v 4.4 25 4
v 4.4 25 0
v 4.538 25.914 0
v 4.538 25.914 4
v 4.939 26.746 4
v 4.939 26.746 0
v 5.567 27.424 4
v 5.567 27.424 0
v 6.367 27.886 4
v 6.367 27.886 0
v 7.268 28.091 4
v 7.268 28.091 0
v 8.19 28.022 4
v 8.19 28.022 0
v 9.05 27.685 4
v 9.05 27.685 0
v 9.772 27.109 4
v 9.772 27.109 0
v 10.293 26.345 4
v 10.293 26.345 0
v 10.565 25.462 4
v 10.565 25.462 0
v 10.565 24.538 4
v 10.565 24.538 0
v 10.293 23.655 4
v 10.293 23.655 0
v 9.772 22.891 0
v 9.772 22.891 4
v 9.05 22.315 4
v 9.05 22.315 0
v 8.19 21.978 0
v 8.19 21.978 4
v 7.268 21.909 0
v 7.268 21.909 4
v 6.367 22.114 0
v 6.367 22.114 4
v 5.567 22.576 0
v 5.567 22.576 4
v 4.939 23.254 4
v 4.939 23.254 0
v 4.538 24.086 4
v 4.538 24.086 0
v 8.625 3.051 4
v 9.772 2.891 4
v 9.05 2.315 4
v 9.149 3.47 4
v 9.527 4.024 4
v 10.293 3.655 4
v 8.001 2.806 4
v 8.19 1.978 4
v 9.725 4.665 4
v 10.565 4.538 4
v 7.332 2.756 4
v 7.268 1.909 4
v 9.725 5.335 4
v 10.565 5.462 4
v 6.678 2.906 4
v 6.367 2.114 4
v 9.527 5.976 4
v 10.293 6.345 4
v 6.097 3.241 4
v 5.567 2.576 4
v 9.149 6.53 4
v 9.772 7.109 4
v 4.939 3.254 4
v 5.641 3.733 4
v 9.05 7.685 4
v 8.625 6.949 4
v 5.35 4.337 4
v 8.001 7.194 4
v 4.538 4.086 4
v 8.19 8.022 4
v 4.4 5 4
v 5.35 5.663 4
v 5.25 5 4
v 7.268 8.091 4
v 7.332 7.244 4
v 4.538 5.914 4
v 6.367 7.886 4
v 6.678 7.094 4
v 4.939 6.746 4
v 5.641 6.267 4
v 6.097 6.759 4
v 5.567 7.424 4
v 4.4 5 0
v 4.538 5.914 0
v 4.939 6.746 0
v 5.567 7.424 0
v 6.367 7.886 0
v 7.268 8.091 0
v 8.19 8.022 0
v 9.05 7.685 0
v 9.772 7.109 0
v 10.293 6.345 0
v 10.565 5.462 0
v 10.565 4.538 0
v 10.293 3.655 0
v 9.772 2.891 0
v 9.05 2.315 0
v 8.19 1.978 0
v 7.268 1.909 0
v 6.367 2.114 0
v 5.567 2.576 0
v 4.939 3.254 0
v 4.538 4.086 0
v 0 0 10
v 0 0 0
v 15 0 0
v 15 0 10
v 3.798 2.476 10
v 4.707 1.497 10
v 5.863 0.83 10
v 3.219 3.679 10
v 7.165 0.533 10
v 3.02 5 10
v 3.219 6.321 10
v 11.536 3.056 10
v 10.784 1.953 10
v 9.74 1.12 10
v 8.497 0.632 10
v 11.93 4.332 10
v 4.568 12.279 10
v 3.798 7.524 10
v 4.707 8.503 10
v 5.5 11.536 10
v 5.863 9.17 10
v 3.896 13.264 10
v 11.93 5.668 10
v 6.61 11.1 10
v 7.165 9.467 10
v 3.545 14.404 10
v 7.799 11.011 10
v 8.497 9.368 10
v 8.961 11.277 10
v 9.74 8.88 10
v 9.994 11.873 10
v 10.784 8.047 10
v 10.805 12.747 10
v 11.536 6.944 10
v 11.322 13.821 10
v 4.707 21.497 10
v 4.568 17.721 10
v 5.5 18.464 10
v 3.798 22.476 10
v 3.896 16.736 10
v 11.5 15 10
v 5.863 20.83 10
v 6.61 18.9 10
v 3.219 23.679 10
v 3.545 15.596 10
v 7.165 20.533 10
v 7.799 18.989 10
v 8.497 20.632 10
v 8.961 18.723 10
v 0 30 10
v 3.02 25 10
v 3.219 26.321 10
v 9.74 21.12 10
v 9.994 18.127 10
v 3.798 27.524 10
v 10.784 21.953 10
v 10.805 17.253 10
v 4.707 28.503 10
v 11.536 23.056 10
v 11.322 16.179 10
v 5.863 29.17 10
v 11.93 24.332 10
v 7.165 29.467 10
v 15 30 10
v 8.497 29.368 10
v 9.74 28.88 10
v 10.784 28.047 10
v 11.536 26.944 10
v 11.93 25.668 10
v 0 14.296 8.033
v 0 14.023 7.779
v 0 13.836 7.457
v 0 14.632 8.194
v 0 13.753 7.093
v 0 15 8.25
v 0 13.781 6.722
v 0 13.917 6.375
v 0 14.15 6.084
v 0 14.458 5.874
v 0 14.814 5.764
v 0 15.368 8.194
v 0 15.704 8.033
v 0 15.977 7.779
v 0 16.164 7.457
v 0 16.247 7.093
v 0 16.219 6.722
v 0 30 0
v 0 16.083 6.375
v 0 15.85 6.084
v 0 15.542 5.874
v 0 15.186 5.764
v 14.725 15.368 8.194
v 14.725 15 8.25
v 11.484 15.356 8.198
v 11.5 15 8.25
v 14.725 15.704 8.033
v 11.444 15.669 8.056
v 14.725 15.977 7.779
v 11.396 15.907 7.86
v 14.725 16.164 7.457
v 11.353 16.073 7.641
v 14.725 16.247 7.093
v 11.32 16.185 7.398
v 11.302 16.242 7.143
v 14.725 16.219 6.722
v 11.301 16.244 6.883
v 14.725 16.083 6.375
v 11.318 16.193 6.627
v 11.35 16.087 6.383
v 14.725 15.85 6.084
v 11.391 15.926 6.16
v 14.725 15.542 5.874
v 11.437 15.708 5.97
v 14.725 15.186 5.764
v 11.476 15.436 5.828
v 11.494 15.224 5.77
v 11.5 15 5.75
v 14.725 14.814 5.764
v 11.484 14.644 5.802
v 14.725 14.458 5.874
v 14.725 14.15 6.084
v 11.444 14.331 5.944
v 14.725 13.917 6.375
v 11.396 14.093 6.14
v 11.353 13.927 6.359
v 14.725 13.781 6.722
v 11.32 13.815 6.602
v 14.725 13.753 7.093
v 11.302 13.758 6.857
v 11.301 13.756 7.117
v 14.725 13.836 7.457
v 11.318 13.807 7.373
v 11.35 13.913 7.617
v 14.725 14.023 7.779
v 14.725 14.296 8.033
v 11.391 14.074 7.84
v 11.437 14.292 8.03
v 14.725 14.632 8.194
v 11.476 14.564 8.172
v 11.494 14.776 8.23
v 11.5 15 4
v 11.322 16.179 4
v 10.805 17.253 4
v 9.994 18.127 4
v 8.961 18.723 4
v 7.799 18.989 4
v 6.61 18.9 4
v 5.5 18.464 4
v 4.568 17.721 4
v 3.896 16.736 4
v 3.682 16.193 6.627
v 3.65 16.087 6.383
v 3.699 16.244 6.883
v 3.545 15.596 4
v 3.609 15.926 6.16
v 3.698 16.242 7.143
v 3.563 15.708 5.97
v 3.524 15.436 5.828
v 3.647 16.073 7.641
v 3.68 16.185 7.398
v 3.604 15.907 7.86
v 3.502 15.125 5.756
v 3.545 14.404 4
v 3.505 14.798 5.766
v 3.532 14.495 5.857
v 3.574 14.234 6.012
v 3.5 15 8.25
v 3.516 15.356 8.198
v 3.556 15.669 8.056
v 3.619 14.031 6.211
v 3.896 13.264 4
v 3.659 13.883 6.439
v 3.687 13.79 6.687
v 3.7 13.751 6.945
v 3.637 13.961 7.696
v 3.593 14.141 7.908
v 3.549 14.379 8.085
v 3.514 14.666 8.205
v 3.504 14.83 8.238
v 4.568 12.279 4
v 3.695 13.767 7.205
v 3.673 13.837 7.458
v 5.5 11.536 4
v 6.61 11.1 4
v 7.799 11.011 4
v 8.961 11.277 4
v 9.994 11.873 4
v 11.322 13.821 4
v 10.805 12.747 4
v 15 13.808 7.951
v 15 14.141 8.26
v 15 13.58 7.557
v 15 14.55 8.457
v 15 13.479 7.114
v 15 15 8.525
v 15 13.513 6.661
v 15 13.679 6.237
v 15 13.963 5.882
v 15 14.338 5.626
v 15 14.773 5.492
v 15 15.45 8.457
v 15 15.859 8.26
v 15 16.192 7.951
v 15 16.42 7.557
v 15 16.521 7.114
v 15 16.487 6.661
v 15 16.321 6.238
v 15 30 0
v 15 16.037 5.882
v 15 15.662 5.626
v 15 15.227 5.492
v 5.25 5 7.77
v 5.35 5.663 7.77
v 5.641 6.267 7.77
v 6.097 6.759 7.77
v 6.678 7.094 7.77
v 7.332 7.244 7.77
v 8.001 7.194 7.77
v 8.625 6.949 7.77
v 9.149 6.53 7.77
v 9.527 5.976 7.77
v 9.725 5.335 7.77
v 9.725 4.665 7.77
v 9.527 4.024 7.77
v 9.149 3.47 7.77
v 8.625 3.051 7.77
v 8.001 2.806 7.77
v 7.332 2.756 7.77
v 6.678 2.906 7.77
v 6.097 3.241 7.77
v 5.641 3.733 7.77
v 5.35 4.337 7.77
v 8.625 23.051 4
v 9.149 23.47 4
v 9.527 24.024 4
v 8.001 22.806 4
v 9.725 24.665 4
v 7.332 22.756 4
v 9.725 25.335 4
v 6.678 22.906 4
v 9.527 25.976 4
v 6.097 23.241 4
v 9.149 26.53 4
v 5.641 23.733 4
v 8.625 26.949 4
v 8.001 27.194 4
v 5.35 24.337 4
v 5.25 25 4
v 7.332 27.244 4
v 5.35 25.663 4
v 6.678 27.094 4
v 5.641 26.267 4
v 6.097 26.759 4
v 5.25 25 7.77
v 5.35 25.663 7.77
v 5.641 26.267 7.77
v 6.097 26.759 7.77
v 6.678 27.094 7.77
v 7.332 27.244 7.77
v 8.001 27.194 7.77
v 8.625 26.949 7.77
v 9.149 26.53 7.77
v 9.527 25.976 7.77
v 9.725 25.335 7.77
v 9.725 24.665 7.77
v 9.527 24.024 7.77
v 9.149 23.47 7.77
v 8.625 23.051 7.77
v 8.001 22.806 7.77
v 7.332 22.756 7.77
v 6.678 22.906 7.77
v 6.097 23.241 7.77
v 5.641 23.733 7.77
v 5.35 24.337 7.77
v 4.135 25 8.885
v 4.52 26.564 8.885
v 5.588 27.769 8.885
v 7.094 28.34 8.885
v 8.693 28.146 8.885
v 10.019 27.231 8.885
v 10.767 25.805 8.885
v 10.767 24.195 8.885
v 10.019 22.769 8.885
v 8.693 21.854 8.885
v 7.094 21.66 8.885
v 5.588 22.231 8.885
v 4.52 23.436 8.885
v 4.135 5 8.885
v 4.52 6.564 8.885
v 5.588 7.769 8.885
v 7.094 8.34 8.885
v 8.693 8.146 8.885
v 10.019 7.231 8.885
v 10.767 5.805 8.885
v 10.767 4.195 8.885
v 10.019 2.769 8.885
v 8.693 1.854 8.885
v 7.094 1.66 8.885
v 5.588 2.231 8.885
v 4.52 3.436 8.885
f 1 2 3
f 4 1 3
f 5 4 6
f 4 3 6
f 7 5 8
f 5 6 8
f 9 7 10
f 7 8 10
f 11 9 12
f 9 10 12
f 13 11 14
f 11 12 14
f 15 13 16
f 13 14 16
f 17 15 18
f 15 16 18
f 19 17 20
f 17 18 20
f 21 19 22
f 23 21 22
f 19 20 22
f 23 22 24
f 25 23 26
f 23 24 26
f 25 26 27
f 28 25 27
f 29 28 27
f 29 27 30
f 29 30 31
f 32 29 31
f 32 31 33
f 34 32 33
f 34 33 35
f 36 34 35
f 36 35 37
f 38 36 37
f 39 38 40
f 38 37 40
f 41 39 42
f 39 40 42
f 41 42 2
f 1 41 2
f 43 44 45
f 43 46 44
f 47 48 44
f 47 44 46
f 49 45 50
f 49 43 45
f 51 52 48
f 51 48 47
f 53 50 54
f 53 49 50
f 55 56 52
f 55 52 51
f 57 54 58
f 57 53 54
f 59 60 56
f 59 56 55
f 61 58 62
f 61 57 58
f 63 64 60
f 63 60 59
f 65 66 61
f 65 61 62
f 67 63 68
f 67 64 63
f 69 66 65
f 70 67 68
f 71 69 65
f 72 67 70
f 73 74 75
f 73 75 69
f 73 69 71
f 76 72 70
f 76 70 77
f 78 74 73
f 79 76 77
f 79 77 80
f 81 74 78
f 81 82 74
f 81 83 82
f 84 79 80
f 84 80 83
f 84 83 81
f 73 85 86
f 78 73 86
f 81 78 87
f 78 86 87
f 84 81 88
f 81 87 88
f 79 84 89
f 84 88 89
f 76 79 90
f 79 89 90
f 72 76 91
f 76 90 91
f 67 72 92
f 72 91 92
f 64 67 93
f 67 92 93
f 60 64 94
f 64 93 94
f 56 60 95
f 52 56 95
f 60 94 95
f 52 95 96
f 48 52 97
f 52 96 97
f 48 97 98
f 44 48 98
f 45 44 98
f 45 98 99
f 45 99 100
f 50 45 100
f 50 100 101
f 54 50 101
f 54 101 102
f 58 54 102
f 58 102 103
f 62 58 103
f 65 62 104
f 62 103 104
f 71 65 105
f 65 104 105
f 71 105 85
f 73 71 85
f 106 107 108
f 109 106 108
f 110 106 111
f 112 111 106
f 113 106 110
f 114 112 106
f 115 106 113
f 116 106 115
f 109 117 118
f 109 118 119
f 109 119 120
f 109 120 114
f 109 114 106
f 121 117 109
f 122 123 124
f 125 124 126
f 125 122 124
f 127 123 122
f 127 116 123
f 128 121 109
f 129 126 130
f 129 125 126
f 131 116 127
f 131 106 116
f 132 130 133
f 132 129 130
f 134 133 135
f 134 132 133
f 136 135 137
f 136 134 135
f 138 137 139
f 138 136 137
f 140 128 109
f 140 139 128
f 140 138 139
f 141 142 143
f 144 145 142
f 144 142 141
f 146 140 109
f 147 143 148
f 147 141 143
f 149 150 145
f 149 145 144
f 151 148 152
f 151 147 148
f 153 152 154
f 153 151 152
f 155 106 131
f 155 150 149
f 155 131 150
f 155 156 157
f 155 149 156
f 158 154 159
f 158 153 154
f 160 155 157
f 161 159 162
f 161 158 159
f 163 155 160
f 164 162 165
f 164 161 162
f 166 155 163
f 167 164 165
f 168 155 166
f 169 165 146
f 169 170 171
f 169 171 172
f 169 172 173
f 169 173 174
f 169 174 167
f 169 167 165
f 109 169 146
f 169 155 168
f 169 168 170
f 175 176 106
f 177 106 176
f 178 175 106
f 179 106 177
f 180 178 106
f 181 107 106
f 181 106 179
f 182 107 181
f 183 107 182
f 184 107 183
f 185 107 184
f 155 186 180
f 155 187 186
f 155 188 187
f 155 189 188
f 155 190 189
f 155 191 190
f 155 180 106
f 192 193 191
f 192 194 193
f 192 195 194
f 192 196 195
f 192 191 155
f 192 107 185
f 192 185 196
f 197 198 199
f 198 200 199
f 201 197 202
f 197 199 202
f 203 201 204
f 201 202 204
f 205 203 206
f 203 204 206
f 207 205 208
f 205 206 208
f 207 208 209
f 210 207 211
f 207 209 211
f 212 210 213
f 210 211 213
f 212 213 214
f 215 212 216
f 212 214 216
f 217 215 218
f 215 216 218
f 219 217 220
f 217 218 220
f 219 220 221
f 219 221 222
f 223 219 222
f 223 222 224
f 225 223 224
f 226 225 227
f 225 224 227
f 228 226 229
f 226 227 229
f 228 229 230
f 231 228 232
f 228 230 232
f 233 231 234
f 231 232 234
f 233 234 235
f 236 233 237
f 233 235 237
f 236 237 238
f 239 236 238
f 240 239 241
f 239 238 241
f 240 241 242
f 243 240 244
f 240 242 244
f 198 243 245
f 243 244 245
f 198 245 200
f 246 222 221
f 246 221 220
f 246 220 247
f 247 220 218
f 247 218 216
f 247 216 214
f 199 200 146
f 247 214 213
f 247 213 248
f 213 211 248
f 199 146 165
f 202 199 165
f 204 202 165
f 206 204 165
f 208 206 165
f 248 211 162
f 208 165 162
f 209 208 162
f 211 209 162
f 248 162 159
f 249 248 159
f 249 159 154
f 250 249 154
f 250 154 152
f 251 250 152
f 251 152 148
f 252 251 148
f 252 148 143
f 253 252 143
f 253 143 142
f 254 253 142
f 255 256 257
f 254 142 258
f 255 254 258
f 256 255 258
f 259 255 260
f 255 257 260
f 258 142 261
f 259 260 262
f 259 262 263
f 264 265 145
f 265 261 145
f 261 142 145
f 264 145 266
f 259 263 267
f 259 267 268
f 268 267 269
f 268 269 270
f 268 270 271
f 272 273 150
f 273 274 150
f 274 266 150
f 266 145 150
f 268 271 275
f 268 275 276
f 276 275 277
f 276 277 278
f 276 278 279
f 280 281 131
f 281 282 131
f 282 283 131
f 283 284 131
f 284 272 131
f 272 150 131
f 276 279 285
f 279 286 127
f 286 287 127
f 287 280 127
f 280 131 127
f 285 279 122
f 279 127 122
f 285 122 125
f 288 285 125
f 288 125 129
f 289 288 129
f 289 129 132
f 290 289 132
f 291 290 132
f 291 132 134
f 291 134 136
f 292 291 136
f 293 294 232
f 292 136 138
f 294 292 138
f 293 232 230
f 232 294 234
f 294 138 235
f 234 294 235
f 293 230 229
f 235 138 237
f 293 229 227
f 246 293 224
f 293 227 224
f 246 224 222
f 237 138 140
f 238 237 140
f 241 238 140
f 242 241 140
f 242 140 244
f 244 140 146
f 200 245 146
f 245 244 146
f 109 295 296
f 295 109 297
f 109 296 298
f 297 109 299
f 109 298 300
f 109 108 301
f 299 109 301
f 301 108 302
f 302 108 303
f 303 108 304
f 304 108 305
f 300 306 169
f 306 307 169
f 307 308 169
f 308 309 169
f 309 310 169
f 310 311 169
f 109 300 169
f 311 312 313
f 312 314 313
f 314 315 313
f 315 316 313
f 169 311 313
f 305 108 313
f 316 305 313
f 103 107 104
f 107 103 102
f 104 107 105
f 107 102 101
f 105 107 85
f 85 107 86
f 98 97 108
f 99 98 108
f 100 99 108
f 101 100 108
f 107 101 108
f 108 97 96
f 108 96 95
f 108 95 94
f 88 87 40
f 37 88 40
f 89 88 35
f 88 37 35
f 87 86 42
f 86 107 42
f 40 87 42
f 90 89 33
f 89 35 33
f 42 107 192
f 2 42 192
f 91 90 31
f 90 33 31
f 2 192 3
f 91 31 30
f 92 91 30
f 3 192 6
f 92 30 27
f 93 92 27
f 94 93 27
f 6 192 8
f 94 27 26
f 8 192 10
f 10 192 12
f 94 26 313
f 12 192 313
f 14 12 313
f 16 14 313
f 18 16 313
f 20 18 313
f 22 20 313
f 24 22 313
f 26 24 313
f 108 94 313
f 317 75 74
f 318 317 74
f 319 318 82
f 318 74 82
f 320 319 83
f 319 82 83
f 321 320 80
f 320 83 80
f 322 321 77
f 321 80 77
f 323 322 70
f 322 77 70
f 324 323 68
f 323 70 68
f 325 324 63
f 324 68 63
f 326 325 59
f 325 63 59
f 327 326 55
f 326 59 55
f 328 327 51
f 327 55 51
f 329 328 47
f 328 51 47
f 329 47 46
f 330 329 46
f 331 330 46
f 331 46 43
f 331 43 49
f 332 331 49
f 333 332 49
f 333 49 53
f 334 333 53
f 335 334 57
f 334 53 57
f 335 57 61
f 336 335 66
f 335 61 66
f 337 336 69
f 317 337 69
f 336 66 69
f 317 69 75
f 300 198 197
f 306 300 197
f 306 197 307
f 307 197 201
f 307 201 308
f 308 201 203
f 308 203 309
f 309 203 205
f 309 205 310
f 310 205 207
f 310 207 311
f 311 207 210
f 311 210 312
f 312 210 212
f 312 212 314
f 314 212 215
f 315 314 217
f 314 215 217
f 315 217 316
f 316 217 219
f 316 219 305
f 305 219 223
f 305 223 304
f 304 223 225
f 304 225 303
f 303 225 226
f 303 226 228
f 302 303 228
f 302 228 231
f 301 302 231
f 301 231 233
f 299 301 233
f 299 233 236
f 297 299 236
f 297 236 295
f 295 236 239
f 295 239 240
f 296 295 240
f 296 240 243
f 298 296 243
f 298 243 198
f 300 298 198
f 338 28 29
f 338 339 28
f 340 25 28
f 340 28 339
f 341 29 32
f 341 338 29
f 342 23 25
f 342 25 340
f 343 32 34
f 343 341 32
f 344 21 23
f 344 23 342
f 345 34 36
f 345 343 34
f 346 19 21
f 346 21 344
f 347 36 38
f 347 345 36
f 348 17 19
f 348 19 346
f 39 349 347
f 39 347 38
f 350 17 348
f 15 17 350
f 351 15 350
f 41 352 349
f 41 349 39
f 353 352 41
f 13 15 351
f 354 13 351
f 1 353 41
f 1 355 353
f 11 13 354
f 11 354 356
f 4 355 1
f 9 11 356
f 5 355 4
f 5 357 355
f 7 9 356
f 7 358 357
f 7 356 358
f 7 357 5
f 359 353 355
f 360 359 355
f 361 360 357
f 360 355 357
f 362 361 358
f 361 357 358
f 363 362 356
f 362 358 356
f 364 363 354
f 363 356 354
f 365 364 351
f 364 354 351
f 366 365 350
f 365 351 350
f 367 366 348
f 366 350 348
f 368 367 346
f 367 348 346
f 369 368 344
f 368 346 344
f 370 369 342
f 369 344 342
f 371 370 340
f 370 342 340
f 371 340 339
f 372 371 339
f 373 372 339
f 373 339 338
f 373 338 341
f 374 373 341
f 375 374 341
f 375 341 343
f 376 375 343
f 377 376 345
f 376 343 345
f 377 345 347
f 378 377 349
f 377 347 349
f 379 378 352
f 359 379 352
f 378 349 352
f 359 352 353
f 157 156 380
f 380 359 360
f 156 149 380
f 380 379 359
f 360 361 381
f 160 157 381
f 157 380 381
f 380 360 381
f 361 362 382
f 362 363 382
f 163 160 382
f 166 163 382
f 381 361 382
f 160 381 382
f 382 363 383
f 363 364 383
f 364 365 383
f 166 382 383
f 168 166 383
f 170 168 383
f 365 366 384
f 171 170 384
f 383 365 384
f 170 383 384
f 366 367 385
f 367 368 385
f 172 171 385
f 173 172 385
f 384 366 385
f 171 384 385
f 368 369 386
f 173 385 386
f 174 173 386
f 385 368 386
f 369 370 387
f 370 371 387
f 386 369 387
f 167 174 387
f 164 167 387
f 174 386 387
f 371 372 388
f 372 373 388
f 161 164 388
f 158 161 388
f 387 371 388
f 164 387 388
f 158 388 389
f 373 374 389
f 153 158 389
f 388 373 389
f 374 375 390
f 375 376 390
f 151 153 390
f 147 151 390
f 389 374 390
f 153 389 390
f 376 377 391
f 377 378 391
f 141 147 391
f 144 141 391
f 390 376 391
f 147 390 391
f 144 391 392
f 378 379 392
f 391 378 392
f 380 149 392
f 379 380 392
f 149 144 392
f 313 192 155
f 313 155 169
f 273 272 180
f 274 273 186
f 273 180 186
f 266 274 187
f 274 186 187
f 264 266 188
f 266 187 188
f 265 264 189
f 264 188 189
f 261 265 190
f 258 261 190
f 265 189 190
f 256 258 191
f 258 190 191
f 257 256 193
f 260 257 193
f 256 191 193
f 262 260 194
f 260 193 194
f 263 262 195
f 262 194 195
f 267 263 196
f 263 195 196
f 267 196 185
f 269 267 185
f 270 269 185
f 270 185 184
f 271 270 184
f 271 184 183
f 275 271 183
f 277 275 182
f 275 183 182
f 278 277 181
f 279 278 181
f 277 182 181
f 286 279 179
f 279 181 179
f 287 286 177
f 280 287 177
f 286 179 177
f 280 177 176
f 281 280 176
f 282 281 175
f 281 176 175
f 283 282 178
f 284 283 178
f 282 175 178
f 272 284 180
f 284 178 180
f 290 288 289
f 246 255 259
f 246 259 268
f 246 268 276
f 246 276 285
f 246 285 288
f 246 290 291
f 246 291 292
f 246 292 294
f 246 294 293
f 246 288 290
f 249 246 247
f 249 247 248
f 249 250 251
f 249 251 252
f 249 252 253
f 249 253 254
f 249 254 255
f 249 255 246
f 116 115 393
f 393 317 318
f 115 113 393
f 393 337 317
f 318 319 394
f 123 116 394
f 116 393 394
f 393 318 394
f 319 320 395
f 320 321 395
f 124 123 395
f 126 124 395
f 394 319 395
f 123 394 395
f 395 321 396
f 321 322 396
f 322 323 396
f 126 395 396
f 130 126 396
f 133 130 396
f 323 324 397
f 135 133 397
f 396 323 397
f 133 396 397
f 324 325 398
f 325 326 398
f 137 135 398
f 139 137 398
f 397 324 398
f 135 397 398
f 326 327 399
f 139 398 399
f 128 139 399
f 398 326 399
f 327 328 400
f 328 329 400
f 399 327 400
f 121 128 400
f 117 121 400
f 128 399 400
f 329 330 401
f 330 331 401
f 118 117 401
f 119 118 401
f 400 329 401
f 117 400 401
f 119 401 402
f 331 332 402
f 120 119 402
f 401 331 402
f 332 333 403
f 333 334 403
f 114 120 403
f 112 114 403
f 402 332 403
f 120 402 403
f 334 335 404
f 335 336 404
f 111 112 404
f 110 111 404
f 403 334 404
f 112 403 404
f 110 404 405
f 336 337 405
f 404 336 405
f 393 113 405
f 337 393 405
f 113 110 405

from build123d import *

# Parameters (mm, degrees)
SKIZZE1_W                             = 15
SKIZZE1_H                             = 30
AUFSATZ_LINEAR_AUSTRAGEN1_DEPTH       = 10
FORMSENKUNG_F_R_M4_SFHCS1_D           = 4.5
FORMSENKUNG_F_R_M4_SFHCS1_CSINK_D     = 8.96
FORMSENKUNG_F_R_M4_SFHCS1_CSINK_ANGLE = 90
SKIZZE4_R                             = 3.1
SCHNITT_LINEAR_AUSTRAGEN1_DEPTH       = 4
SKIZZE7_R                             = 4
SCHNITT_LINEAR_AUSTRAGEN2_DEPTH       = 6
M3X0_5_GEWINDEBOHRUNG1_D              = 2.5
M3X0_5_GEWINDEBOHRUNG1_CSINK_D        = 3.05
M3X0_5_GEWINDEBOHRUNG1_CSINK_ANGLE    = 90


with BuildPart() as part:
    # Skizze1 → Aufsatz-Linear austragen1 (new body)
    with BuildSketch(Plane.XY):
        with Locations((7.5, 15)):
            Rectangle(SKIZZE1_W, SKIZZE1_H)
    extrude(amount=AUFSATZ_LINEAR_AUSTRAGEN1_DEPTH)

    # Formsenkung für M4 SFHCS1 (through all)
    with Locations(Plane.XY.offset(10)):
        with Locations((7.5, 25), (7.5, 5)):
            CounterSinkHole(FORMSENKUNG_F_R_M4_SFHCS1_D / 2, FORMSENKUNG_F_R_M4_SFHCS1_CSINK_D / 2, counter_sink_angle=FORMSENKUNG_F_R_M4_SFHCS1_CSINK_ANGLE)

    # Skizze4 → Schnitt-Linear austragen1 (cut)
    with BuildSketch(Plane(origin=(0, 0, 0), x_dir=(-1, 0, 0), z_dir=(0, 0, -1))):
        with Locations((-7.5, 25)):
            Circle(SKIZZE4_R)
        with Locations((-7.5, 5)):
            Circle(SKIZZE4_R)
    extrude(amount=-SCHNITT_LINEAR_AUSTRAGEN1_DEPTH, mode=Mode.SUBTRACT)

    # Skizze7 → Schnitt-Linear austragen2 (cut)
    with BuildSketch(Plane.XY.offset(10)):
        with Locations((7.5, 15)):
            Circle(SKIZZE7_R)
    extrude(amount=-SCHNITT_LINEAR_AUSTRAGEN2_DEPTH, mode=Mode.SUBTRACT)

    # M3x0.5 Gewindebohrung1 (through all)
    with Locations(Plane(origin=(15, 0, 0), x_dir=(0, 0, -1), z_dir=(1, 0, 0))):
        with Locations((-7, 15)):
            CounterSinkHole(M3X0_5_GEWINDEBOHRUNG1_D / 2, M3X0_5_GEWINDEBOHRUNG1_CSINK_D / 2, counter_sink_angle=M3X0_5_GEWINDEBOHRUNG1_CSINK_ANGLE)


solid = part.part
